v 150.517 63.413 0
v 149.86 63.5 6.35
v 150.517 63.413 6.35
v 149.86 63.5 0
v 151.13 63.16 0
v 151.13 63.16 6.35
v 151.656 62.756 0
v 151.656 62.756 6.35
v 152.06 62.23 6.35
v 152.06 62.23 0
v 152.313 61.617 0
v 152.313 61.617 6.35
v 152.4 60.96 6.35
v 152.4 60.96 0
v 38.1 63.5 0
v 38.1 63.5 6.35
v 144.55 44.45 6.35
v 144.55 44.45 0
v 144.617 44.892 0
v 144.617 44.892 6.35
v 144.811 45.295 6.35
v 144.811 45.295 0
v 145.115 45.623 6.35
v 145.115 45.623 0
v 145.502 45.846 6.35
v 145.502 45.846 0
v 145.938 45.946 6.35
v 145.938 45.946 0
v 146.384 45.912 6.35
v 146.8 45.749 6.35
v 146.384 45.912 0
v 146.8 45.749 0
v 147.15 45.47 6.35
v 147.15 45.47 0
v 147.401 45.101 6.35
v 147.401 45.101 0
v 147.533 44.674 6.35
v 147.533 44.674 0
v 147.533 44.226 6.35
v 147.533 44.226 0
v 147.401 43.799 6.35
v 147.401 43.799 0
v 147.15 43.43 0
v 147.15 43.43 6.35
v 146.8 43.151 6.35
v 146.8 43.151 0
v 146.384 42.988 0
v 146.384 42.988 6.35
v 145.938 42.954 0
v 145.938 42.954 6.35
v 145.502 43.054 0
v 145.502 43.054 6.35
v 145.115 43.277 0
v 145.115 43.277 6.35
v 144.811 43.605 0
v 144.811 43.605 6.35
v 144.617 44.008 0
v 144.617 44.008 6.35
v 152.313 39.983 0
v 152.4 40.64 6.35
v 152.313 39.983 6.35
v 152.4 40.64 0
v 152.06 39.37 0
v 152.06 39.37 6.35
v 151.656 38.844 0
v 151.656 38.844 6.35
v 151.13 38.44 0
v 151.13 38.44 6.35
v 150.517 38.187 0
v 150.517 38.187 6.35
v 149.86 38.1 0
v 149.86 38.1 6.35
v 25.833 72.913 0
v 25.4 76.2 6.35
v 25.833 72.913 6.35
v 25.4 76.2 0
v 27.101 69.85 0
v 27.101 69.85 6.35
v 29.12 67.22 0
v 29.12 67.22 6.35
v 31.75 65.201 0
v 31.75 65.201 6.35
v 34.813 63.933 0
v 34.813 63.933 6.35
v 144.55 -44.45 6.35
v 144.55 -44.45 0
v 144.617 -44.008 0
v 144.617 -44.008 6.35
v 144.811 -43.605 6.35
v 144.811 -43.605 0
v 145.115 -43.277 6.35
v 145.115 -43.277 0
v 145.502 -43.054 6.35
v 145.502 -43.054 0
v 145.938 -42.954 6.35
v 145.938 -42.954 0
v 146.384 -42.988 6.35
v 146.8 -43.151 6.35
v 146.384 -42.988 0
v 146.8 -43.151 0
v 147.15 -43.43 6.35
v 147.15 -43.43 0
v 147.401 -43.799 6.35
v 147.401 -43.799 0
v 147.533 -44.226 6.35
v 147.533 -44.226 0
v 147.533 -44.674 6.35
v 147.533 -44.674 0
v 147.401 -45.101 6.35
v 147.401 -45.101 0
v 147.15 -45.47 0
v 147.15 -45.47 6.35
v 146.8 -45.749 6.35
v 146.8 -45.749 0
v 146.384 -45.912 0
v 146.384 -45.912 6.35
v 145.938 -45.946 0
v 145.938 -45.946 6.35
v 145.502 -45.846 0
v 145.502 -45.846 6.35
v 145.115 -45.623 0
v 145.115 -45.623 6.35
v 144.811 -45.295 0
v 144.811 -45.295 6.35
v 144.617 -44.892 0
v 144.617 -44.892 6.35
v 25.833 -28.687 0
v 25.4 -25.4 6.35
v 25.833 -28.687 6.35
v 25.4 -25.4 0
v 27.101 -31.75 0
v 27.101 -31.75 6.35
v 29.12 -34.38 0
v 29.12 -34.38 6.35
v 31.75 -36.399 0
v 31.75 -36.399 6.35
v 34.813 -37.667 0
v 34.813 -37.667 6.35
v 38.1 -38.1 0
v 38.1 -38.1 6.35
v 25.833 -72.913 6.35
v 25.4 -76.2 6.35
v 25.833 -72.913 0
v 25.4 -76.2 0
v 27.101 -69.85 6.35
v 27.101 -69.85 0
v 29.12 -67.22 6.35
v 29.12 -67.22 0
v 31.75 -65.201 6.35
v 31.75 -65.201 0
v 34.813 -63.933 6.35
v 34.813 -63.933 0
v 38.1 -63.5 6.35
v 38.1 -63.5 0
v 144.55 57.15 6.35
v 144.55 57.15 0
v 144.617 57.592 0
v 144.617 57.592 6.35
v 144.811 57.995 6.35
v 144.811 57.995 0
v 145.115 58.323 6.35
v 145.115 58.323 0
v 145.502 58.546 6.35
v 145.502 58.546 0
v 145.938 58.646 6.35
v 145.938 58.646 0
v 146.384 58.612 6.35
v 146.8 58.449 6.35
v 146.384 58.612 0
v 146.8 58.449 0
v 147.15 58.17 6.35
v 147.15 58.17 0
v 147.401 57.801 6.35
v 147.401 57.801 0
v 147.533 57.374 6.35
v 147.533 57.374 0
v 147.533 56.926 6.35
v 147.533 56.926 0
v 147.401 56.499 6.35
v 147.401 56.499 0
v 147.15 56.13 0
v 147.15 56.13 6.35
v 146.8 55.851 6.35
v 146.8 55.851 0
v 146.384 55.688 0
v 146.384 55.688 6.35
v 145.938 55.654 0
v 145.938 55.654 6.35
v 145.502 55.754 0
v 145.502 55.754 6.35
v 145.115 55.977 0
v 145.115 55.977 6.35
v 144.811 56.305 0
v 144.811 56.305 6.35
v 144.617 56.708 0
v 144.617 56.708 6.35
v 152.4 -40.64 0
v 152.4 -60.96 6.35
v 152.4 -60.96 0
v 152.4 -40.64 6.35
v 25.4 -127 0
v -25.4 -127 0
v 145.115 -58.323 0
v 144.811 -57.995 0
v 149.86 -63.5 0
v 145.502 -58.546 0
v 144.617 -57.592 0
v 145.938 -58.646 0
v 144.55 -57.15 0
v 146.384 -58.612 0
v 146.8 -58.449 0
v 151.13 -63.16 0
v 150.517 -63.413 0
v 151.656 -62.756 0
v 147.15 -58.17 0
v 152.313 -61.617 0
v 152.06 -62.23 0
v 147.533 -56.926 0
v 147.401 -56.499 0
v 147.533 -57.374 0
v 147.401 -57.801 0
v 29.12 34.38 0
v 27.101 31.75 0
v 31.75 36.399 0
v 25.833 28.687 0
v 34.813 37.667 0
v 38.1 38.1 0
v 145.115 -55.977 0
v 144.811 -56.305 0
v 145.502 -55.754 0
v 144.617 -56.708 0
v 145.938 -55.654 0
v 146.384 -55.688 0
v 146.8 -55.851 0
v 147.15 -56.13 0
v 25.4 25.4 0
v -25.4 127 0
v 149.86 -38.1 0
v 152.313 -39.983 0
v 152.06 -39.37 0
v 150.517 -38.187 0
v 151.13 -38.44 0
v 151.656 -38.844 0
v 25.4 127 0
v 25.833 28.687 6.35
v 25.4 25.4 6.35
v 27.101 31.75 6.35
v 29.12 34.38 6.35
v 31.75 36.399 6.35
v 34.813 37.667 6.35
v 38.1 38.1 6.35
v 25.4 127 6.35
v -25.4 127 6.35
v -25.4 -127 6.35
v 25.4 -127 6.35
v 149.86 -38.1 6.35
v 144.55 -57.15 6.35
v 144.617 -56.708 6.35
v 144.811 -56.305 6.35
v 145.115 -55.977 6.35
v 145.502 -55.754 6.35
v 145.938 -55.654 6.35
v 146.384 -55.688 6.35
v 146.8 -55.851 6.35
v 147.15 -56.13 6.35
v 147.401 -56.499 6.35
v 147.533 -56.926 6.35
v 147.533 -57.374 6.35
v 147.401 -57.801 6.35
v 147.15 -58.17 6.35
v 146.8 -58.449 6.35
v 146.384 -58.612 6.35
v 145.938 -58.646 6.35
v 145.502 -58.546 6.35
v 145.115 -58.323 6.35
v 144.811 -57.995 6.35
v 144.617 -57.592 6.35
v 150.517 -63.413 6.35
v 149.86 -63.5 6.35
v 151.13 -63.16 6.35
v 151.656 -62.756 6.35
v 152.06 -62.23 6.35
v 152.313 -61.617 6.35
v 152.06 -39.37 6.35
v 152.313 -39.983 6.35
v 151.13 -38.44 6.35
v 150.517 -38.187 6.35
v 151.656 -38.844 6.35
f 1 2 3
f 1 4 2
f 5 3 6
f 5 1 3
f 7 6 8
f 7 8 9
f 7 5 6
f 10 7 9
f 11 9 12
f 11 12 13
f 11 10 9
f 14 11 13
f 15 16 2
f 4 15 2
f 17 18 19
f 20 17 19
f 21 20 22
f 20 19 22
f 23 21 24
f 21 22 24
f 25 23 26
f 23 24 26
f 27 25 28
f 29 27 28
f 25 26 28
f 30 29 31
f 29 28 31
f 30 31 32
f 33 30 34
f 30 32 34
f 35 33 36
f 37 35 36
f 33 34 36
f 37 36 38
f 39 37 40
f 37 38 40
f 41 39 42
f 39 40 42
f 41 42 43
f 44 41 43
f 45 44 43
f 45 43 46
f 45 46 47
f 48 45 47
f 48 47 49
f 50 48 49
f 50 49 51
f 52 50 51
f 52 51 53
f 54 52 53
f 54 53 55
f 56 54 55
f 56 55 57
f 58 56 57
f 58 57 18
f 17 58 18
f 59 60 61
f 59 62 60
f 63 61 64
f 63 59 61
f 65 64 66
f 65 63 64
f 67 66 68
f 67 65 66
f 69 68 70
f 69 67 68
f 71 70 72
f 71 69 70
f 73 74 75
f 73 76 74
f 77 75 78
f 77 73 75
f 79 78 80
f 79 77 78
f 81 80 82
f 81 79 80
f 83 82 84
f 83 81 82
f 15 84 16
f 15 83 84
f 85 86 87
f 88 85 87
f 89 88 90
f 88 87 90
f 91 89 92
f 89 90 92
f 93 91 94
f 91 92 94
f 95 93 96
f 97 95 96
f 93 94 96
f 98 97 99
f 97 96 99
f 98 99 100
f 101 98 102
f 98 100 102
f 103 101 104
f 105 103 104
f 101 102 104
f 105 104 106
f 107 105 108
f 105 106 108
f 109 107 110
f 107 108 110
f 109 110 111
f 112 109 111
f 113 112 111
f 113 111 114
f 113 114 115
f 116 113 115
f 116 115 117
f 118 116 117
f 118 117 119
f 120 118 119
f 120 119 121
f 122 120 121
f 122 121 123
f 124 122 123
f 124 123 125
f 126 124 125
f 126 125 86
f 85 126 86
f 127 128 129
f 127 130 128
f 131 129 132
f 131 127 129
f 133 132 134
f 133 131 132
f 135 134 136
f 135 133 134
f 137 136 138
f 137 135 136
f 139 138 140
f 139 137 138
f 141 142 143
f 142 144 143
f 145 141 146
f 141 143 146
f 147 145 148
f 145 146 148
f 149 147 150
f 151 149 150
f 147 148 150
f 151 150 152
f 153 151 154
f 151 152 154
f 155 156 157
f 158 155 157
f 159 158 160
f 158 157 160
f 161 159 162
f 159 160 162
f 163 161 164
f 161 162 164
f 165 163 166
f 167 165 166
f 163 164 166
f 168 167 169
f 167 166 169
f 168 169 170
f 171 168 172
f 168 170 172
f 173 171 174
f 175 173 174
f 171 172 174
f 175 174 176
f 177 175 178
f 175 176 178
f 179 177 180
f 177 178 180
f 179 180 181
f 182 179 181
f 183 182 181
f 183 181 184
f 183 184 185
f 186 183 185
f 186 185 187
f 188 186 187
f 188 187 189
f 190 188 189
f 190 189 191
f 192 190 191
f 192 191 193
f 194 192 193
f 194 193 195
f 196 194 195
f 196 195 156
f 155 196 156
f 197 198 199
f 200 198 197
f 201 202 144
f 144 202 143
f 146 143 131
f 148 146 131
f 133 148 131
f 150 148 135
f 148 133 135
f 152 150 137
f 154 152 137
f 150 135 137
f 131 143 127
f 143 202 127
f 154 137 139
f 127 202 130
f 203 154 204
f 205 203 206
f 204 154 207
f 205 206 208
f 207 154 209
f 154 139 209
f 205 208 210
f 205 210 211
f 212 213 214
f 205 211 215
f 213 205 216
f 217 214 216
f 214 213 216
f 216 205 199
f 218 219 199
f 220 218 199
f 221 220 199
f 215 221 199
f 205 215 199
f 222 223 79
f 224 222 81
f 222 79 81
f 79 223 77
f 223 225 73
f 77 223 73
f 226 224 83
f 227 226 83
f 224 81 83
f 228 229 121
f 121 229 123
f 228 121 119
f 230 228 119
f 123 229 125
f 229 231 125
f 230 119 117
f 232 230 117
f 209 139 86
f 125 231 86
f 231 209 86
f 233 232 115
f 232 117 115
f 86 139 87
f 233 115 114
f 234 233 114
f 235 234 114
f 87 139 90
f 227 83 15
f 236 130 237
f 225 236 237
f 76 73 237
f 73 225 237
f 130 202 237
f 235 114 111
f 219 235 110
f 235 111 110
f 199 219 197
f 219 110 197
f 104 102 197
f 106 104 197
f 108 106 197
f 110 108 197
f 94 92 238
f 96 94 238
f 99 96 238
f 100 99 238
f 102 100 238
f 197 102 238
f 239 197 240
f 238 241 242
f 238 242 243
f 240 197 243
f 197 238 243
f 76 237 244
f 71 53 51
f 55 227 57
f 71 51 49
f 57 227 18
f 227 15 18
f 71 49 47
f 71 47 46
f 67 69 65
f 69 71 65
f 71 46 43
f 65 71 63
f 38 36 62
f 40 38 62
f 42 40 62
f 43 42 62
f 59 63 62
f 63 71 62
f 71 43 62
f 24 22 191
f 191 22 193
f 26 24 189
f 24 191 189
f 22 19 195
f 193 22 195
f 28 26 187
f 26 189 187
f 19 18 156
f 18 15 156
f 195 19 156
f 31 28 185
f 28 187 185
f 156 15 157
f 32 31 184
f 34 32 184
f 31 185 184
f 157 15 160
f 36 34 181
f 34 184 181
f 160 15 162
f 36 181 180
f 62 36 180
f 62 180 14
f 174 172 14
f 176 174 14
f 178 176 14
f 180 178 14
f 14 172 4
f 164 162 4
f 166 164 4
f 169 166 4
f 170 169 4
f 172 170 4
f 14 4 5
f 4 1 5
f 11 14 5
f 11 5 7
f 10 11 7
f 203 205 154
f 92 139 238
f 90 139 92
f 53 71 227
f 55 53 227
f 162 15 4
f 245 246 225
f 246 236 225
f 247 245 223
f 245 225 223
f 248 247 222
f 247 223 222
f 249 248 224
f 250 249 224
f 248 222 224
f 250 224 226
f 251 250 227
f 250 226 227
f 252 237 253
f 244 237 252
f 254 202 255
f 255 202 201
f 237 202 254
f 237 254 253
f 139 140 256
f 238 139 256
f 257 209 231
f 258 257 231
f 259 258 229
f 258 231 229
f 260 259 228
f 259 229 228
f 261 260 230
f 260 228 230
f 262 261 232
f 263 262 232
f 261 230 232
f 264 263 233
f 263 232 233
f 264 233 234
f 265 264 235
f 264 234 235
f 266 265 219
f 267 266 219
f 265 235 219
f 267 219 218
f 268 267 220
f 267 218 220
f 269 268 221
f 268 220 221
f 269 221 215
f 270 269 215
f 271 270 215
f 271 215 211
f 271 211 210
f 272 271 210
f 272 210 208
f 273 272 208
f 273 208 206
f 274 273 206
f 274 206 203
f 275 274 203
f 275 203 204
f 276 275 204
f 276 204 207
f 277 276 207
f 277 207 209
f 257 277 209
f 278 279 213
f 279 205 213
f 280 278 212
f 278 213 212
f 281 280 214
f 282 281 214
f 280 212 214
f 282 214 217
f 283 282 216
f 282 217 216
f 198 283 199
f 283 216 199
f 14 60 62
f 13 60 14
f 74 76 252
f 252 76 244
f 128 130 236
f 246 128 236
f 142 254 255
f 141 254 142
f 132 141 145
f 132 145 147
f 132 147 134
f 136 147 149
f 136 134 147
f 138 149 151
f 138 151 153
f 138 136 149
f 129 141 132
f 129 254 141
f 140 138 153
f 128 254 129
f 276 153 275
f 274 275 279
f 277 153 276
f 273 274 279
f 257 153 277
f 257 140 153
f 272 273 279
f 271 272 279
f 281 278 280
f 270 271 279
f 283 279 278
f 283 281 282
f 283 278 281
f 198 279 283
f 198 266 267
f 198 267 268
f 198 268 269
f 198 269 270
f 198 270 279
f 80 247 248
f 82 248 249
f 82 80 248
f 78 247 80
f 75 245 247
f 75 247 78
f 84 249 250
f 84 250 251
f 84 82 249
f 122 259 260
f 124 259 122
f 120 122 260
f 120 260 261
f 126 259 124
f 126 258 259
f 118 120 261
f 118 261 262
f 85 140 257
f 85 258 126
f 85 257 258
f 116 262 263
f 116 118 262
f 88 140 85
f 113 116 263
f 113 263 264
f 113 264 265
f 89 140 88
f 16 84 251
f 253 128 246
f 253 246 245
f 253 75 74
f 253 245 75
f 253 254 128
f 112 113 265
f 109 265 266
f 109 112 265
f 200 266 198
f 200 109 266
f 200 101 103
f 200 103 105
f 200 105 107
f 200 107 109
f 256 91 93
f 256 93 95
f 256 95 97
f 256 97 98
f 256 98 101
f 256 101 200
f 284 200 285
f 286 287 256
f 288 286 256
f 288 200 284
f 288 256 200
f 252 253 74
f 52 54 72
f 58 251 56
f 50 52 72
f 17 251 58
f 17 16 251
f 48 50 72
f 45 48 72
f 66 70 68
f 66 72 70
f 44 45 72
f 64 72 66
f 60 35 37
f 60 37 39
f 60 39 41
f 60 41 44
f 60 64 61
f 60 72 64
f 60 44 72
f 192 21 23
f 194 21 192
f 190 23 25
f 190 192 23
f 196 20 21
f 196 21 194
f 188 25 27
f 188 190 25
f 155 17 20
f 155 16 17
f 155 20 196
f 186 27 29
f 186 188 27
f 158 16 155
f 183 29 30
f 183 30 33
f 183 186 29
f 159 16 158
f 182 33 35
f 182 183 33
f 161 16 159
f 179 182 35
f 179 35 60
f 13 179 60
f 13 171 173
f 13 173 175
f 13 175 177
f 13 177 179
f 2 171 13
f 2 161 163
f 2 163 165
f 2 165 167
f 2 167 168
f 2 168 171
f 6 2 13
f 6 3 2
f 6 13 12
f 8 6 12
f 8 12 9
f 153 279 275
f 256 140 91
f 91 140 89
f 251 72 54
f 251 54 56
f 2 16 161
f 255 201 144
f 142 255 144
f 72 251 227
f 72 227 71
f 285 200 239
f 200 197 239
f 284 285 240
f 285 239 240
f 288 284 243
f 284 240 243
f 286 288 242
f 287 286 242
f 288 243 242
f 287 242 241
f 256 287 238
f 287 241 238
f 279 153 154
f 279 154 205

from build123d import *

# Parameters (mm, degrees)
ESQUISSE1_W             = 50.8
ESQUISSE1_H             = 254
BOSS_EXTRU_1_DEPTH      = 6.35
ESQUISSE2_W             = 127
ESQUISSE2_H             = 25.4
BOSS_EXTRU_2_DEPTH      = 6.35
CONG_1_R                = 12.7
CONG_2_R                = 2.54
ESQUISSE3_R             = 1.5
ENL_V_MAT_EXTRU_1_DEPTH = 199.481945023


with BuildPart() as part:
    # Esquisse1 → Boss.-Extru.1 (new body)
    with BuildSketch(Plane.XY):
        Rectangle(ESQUISSE1_W, ESQUISSE1_H)
    extrude(amount=BOSS_EXTRU_1_DEPTH)

    # Esquisse2 → Boss.-Extru.2 (add)
    with BuildSketch(Plane.XY.offset(6.35)):
        with Locations((88.9, -50.8)):
            Rectangle(ESQUISSE2_W, ESQUISSE2_H)
        with Locations((88.9, 50.8)):
            Rectangle(ESQUISSE2_W, ESQUISSE2_H)
    extrude(amount=-BOSS_EXTRU_2_DEPTH)

    # Congé1
    cong_1_edges = [part.edges().sort_by_distance(p)[0] for p in [
        (25.4, -63.5, 3.175),
        (25.4, -38.1, 3.175),
        (25.4, 38.1, 3.175),
        (25.4, 63.5, 3.175),
    ]]
    fillet(cong_1_edges, radius=CONG_1_R)

    # Congé2
    cong_2_edges = [part.edges().sort_by_distance(p)[0] for p in [
        (152.4, -38.1, 3.175),
        (152.4, -63.5, 3.175),
        (152.4, 63.5, 3.175),
        (152.4, 38.1, 3.175),
    ]]
    fillet(cong_2_edges, radius=CONG_2_R)

    # Esquisse3 → Enlèv. mat.-Extru.1 (cut, through all)
    with BuildSketch(Plane(origin=(0, 0, 0), x_dir=(-1, 0, 0), z_dir=(0, 0, -1))):
        with Locations((-146.05, 57.15)):
            Circle(ESQUISSE3_R)
        with Locations((-146.05, 44.45)):
            Circle(ESQUISSE3_R)
        with Locations((-146.05, -44.45)):
            Circle(ESQUISSE3_R)
        with Locations((-146.05, -57.15)):
            Circle(ESQUISSE3_R)
    extrude(amount=-ENL_V_MAT_EXTRU_1_DEPTH, mode=Mode.SUBTRACT)


solid = part.part
